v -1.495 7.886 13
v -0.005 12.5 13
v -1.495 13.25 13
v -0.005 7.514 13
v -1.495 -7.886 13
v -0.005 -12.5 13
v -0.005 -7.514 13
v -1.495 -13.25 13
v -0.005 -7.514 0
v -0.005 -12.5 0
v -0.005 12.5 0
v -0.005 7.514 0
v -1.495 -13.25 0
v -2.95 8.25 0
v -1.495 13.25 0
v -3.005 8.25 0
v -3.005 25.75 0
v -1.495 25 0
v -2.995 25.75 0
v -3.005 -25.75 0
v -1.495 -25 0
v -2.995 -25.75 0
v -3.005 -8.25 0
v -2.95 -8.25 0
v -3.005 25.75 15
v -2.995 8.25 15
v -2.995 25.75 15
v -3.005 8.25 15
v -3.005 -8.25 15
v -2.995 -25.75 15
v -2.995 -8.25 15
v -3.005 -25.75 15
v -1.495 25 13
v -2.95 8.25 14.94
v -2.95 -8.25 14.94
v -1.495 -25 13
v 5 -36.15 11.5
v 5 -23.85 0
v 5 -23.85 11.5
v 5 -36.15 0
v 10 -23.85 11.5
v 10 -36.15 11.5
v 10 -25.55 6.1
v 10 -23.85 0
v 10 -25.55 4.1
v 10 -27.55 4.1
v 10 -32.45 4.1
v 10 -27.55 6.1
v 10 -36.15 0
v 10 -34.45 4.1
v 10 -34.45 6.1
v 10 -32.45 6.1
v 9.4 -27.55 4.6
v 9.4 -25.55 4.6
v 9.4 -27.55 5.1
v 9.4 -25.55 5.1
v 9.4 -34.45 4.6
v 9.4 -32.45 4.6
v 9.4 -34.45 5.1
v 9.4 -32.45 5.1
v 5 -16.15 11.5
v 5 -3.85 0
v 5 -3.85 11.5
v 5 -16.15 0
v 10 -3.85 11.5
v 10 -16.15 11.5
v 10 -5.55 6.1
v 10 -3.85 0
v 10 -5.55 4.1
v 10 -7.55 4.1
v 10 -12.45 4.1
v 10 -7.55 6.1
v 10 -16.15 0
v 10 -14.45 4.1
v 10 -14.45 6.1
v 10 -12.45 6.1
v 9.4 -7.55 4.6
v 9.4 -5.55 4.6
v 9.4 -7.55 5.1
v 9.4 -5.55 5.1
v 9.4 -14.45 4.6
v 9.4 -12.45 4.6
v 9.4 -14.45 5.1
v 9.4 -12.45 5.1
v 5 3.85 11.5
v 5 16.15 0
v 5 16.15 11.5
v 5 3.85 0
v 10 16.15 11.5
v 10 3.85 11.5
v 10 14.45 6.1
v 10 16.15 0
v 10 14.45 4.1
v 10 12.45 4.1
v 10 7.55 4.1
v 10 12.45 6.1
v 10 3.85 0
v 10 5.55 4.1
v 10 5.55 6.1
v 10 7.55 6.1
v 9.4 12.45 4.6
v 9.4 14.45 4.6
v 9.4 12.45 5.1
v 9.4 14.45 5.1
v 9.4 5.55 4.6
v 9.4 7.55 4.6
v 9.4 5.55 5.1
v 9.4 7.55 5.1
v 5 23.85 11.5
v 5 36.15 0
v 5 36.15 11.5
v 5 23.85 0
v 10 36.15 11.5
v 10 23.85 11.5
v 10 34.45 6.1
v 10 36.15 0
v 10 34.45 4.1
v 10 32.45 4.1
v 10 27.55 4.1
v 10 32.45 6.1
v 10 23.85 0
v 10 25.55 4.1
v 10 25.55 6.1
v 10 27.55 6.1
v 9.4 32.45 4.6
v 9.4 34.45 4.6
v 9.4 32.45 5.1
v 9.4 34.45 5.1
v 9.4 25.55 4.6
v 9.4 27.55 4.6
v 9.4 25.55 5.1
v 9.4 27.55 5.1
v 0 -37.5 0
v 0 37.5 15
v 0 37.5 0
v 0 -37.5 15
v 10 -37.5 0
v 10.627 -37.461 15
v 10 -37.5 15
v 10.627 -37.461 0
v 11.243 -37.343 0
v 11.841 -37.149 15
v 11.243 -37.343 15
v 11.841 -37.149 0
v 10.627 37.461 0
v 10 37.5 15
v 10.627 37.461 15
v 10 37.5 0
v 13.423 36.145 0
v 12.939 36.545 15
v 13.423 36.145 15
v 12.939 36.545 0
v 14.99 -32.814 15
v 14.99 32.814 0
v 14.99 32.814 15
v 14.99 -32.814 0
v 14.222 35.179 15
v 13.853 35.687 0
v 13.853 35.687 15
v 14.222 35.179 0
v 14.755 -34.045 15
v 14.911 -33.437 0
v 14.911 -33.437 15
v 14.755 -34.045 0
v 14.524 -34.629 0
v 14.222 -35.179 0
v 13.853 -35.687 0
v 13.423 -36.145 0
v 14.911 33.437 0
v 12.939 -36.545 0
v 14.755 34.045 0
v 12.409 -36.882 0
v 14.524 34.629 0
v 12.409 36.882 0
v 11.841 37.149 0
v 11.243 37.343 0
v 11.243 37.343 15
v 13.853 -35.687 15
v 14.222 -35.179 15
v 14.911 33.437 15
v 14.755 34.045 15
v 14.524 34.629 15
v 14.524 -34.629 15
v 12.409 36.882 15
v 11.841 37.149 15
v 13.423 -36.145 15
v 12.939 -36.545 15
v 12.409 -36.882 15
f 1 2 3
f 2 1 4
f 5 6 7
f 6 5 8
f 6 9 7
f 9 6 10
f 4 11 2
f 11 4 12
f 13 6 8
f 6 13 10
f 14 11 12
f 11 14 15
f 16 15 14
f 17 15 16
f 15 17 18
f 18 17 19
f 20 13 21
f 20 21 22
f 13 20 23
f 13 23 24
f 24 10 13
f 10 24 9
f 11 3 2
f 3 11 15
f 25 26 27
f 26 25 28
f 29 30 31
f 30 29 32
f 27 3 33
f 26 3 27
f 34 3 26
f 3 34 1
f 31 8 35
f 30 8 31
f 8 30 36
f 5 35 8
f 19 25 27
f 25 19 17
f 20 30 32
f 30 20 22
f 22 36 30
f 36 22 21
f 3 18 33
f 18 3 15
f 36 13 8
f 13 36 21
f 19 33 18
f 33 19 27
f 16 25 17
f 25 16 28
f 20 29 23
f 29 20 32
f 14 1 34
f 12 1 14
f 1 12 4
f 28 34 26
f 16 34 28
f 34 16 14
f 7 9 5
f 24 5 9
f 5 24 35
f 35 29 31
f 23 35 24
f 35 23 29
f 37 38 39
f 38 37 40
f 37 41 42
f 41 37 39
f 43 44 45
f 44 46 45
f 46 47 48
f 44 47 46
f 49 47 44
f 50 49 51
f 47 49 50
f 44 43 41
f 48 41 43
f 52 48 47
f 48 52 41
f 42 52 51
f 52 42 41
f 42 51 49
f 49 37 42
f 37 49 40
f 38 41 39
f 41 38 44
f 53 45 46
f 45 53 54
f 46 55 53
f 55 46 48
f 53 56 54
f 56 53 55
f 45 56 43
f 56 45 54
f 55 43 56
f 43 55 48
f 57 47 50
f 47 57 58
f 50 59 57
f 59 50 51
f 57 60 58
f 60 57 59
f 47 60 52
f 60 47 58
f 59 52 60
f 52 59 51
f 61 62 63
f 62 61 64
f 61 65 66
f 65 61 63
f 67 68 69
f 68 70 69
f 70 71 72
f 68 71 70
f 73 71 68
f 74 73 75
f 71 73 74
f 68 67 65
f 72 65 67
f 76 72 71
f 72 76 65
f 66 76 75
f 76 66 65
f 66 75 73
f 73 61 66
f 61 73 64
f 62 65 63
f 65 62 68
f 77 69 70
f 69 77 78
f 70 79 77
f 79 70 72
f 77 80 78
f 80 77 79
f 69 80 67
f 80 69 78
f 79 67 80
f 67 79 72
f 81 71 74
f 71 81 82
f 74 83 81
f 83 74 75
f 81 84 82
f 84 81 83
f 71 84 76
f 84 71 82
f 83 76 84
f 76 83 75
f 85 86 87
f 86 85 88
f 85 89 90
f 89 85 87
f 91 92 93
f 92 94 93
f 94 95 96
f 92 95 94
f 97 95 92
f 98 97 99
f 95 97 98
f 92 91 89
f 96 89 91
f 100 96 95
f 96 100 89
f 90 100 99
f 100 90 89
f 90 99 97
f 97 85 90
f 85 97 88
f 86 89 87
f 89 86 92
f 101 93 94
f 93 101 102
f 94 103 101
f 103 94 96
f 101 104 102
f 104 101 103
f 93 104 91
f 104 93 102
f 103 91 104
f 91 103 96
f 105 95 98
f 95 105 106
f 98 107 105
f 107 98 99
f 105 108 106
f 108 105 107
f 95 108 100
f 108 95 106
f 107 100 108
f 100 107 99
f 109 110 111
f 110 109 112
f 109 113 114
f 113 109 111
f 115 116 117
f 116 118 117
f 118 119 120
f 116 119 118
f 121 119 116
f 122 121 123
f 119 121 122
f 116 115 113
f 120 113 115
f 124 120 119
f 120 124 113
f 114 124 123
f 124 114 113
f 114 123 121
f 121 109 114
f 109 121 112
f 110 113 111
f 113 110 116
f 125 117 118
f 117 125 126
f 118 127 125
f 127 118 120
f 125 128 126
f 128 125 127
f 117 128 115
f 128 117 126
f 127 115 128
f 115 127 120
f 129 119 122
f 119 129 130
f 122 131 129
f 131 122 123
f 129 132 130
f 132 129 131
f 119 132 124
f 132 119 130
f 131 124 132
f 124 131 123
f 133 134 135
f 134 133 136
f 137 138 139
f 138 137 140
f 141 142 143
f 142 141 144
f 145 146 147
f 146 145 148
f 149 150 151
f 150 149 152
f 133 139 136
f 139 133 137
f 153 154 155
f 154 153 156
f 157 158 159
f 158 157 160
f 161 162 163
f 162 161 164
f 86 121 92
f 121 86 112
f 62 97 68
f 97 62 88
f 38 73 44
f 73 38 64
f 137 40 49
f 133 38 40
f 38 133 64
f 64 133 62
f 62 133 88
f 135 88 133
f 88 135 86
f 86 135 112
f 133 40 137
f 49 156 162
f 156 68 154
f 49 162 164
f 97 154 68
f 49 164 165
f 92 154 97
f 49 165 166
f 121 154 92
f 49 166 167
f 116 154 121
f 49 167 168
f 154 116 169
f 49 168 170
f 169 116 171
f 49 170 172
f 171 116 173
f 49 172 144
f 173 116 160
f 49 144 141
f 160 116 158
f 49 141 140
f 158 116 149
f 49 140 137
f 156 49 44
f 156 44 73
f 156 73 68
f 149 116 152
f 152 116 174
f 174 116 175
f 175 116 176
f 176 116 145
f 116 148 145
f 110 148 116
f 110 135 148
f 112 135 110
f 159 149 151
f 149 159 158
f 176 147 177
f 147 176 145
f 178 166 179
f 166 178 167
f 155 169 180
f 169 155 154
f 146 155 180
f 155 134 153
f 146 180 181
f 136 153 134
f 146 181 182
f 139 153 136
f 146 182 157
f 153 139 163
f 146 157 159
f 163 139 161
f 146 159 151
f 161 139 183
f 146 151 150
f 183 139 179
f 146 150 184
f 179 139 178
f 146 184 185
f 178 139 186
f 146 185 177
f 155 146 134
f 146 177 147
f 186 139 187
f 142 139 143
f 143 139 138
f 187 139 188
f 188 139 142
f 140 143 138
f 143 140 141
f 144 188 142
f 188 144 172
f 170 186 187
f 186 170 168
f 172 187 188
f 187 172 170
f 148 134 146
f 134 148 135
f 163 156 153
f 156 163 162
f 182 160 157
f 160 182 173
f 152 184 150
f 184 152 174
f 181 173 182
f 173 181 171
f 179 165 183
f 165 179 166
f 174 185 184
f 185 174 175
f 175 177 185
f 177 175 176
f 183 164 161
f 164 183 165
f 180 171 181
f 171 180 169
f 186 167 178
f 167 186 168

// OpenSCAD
// Slotted Container Cup
// By Brian Khuu 2023
// Ref: https://www.thingiverse.com/thing:1241017/files Pegboard box by jww January 03, 2016
// This was created for little cardboard cafe
$fn=50;

/* [3D Printer] */
ring_tolerance=0.5;
spike_tolerance=0.5;

/* [Coffee Cup] */
coffeecup_ring_hole_diameter = 80; // Cup rim was 75mm but want to make it easier to pick up cup
coffeecup_ring_lip = 3; // Cup rim was 75mm but want to make it easier to pick up cup
coffeecup_holder_height = 10;

// ------------------------------------------------------
// EmptyBox, JWW, x,y,z,wall  r=riadius of rounding
// ------------------------------------------------------
module EmptyBox(xx,yy,zz,wall,rr)
{ 
    difference()
    {
        HalfRoundedBox(xx,yy,zz,rr);                                 
        translate([wall,wall,wall]) 
            RoundedBox(xx-2*wall,yy-2*wall,zz,rr-wall);
    }
}

// ------------------------------------------------------
// Rounded box, JWW, x,y,z  r=riadius of rounding
// ------------------------------------------------------
module RoundedBox(xx,yy,zz,rr)
{
    hull()
	{
        translate([rr,rr,0])       cylinder(r=rr,h=zz);
        translate([rr,yy-rr,0])    cylinder(r=rr,h=zz);
        translate([xx-rr,rr,0])    cylinder(r=rr,h=zz);
        translate([xx-rr,yy-rr,0]) cylinder(r=rr,h=zz);
    }
}

module HalfRoundedBox(xx,yy,zz,rr)
{ 
    hull()
	{
        translate([rr,rr,0])       cylinder(r=rr,h=zz);
        translate([0,yy-1,0])      cube([1,1,zz]);
        translate([xx-rr,rr,0])    cylinder(r=rr,h=zz);
        translate([xx-1,yy-1,0])   cube([1,1,zz]);
    }
}

module cup_mount(cup_hole_dia, cup_lip, cup_holder_height)
{   
    // Extra offset for shaft
    mount_offset=0;
    shift_offset=1.5;

    // Flange Lock
    difference()
    {
        sheetmetal_thickness = 1.5;
        mount_h = 15+12;
        union()
        {
            union()
            {
                mount_h = 15;
                hull()
                {
                    translate([-0.01,0,mount_h/2-1])
                        cube([0.01,25,mount_h-2],center=true);
                    translate([-sheetmetal_thickness,0,mount_h/2-1])
                        cube([0.01,25+shift_offset,mount_h-2],center=true);
                }
                hull()
                {
                    flange=10/2+10+15-5;
                    translate([-sheetmetal_thickness,0,mount_h/2-1])
                        cube([0.01,flange*2,mount_h-2],center=true);
                    translate([-sheetmetal_thickness-1.5,0,mount_h/2])
                        cube([0.01,flange*2+shift_offset,mount_h],center=true);
                }
            }
        }

        hull()
        {
            translate([0,0,mount_h/2-0.1])
                cube([0.1,15,mount_h+0.3],center=true);
            translate([-3,0,mount_h/2-0.1])
                cube([0.1,15+shift_offset,mount_h+0.3],center=true);
        }
    }

    // Cup Mold
    if (0)
    {
        // Cup Holder
        translate([0,0,cup_holder_height/2])
            difference()
            {
                hull()
                {
                    cube([0.01,45,cup_holder_height],center=true);
                    translate([(cup_hole_dia+cup_lip*2)/2+mount_offset,0,0])
                        cylinder(d=cup_hole_dia+cup_lip*2,h=cup_holder_height,center=true);
                }
                translate([(cup_hole_dia+cup_lip*2)/2+mount_offset,0,0])
                    cylinder(d1=cup_hole_dia+cup_lip*2-1,d2=cup_hole_dia,h=cup_holder_height+0.5,center=true);
            }
            
        hull()
        {
            translate([1,0,cup_holder_height])
                cube([2,45,0.01],center=true);
            translate([0.5/2,0,cup_holder_height+10/2])
                cube([0.5,45,20],center=true);
        }
            
    }
    else if (0)
    {
        // Box
        boxX=75; // 75mm is width of the shelf post at little cardboard cafe. 83mm is the size of Sizzix Big Shot instruction Manual, where we must also plus wall thickness times 2 to fit the manual in.
        boxY=20; // typical Sharpie is 15mm dia, thick bundle of Sizzix Big Shot instruction Manual is 4mm. Must also plus wall thickness times 2 to fit the pen.
        boxZ=90;
        roundBox=6; // 6 norminally, but must be 2 for holding the instruction manual
        translate([0,0,boxZ])
            rotate([0,180,90])
            translate([-boxX/2,-boxY,0])
            EmptyBox(xx=boxX, yy=boxY, zz=boxZ, wall=1.5, rr=roundBox);
    }
    else if (0)
    {
        // Glue Stick Holder
        boxX=40; // 75mm is width of the shelf post at little cardboard cafe. 83mm is the size of Sizzix Big Shot instruction Manual, where we must also plus wall thickness times 2 to fit the manual in.
        boxY=40; // typical Sharpie is 15mm dia, thick bundle of Sizzix Big Shot instruction Manual is 4mm. Must also plus wall thickness times 2 to fit the pen.
        boxZ=80;
        roundBox=20; // 6 norminally, but must be 2 for holding the instruction manual
        translate([0,0,boxZ])
            rotate([0,180,90])
            translate([-boxX/2,-boxY,0])
            EmptyBox(xx=boxX, yy=boxY, zz=boxZ, wall=1.5, rr=roundBox);
    }
    else if (0)
    {
        // Cable Holder
        boxX=75; // 75mm is width of the shelf post at little cardboard cafe. 83mm is the size of Sizzix Big Shot instruction Manual, where we must also plus wall thickness times 2 to fit the manual in.
        boxY=6; // typical Sharpie is 15mm dia, thick bundle of Sizzix Big Shot instruction Manual is 4mm. Must also plus wall thickness times 2 to fit the pen.
        boxZ=15;
        roundBox=2; // 6 norminally, but must be 2 for holding the instruction manual
        wall = 1.0;
        translate([0,0,boxZ])
            rotate([0,180,90])
            translate([-boxX/2,-boxY,0])
            difference()
            {
                HalfRoundedBox(boxX,boxY,boxZ,roundBox);
                translate([wall,wall,-1]) 
                    RoundedBox(boxX-2*wall,boxY-2*wall,boxZ+2,roundBox-wall);
                translate([boxX/2,0,boxZ/2]) 
                    cube([0.4,boxY,boxZ+1],center=true);
            }
    }
    else if (0)
    {
        // Sissor Holder
        boxX=75; // 75mm is width of the shelf post at little cardboard cafe. 83mm is the size of Sizzix Big Shot instruction Manual, where we must also plus wall thickness times 2 to fit the manual in.
        boxY=20; // typical Sharpie is 15mm dia, thick bundle of Sizzix Big Shot instruction Manual is 4mm. Must also plus wall thickness times 2 to fit the pen.
        boxZ=15;
        roundBox=5; // 6 norminally, but must be 2 for holding the instruction manual
        wall = 1.5;
        translate([0,0,boxZ])
            rotate([0,180,90])
            translate([-boxX/2,-boxY,0])
            difference()
            {
                HalfRoundedBox(boxX,boxY,boxZ,roundBox);
                translate([wall,wall,-1]) 
                    RoundedBox(boxX-2*wall,boxY-2*wall,boxZ+2,roundBox-wall);
            }
    }
    else if (0)
    {
        // Screwdriver Holder
        boxX=75; // 75mm is width of the shelf post at little cardboard cafe. 83mm is the size of Sizzix Big Shot instruction Manual, where we must also plus wall thickness times 2 to fit the manual in.
        boxY=15; // typical Sharpie is 15mm dia, thick bundle of Sizzix Big Shot instruction Manual is 4mm. Must also plus wall thickness times 2 to fit the pen.
        boxZ=15;
        roundBox=5; // 6 norminally, but must be 2 for holding the instruction manual
        wall = 1.5;
        translate([0,0,0])
            rotate([0,0,90])
            translate([-boxX/2,-boxY,0])
            difference()
            {
                HalfRoundedBox(boxX,boxY,boxZ,roundBox);
                for(i = [-30:12:30])
                translate([i,0,0])
                union()
                {
                    translate([boxX/2,boxY/2,-1])
                    hull()
                    {
                        cylinder(r=2.5,h=boxZ+2);
                        translate([0,-boxY/2,0])
                            cylinder(r=3,h=boxZ+2);
                    }
                    translate([boxX/2,boxY/2,-1])
                    hull()
                    {
                        cylinder(r2=2.1,r1=(10+1)/2,h=5);
                    }
                }
            }
    }
    else if (1)
    {
        // USB Flash Drive Holder
        // The usb slot is lifted from OpenSCAD USB cable storage for wall mount By kamkalian https://www.printables.com/model/10112-openscad-usb-cable-storage-for-wall-mount/files
        boxX=75; // 75mm is width of the shelf post at little cardboard cafe. 83mm is the size of Sizzix Big Shot instruction Manual, where we must also plus wall thickness times 2 to fit the manual in.
        boxY=15; // typical Sharpie is 15mm dia, thick bundle of Sizzix Big Shot instruction Manual is 4mm. Must also plus wall thickness times 2 to fit the pen.
        boxZ=15;
        roundBox=5; // 6 norminally, but must be 2 for holding the instruction manual
        wall = 1.5;
        translate([0,0,0])
            rotate([0,0,90])
            translate([-boxX/2,-boxY,0])
            difference()
            {
                HalfRoundedBox(boxX,boxY,boxZ,roundBox);
                for(i = [-30:20:30])
                translate([i,0,-1])
                union()
                {
                    usb_length = 12.3;
                    usb_width = 5;
                    usb_height = 12.5;
                    usb_space = 10;
                    
                    translate([boxX/2+usb_length/2,boxY/2-usb_width/2,0])
                    rotate([0,0,90])
                    difference()
                    {
                        cube([usb_width,usb_length,usb_height]); //USB connector
                        
                        // Nubsis
                        translate([0,1.7,7.1]){
                            //cube([0.5,2,2]);
                            rotate([270,0,0]){
                                linear_extrude(2){
                                    polygon([[0,0],[0,2],[0.6,1.5],[0.6,1]]);
                                }
                            }
                            
                        }
                        translate([0,usb_length-1.7-2,7.1]){
                            //cube([0.3,2,2]);
                            rotate([270,0,0]){
                                linear_extrude(2){
                                    polygon([[0,0],[0,2],[0.6,1.5],[0.6,1]]);
                                }
                            }
                        }
                    }
                
                    
                }
            }
    }
}

/*********************************************************************************/

cup_mount(
    cup_hole_dia=coffeecup_ring_hole_diameter, 
    cup_lip=coffeecup_ring_lip,
    cup_holder_height=coffeecup_holder_height);

//Cup Model (Based on salamatea large coffee cup)
if (0)
%translate([0,0,-100]) cylinder(d1=52,d2=75,h=120);
